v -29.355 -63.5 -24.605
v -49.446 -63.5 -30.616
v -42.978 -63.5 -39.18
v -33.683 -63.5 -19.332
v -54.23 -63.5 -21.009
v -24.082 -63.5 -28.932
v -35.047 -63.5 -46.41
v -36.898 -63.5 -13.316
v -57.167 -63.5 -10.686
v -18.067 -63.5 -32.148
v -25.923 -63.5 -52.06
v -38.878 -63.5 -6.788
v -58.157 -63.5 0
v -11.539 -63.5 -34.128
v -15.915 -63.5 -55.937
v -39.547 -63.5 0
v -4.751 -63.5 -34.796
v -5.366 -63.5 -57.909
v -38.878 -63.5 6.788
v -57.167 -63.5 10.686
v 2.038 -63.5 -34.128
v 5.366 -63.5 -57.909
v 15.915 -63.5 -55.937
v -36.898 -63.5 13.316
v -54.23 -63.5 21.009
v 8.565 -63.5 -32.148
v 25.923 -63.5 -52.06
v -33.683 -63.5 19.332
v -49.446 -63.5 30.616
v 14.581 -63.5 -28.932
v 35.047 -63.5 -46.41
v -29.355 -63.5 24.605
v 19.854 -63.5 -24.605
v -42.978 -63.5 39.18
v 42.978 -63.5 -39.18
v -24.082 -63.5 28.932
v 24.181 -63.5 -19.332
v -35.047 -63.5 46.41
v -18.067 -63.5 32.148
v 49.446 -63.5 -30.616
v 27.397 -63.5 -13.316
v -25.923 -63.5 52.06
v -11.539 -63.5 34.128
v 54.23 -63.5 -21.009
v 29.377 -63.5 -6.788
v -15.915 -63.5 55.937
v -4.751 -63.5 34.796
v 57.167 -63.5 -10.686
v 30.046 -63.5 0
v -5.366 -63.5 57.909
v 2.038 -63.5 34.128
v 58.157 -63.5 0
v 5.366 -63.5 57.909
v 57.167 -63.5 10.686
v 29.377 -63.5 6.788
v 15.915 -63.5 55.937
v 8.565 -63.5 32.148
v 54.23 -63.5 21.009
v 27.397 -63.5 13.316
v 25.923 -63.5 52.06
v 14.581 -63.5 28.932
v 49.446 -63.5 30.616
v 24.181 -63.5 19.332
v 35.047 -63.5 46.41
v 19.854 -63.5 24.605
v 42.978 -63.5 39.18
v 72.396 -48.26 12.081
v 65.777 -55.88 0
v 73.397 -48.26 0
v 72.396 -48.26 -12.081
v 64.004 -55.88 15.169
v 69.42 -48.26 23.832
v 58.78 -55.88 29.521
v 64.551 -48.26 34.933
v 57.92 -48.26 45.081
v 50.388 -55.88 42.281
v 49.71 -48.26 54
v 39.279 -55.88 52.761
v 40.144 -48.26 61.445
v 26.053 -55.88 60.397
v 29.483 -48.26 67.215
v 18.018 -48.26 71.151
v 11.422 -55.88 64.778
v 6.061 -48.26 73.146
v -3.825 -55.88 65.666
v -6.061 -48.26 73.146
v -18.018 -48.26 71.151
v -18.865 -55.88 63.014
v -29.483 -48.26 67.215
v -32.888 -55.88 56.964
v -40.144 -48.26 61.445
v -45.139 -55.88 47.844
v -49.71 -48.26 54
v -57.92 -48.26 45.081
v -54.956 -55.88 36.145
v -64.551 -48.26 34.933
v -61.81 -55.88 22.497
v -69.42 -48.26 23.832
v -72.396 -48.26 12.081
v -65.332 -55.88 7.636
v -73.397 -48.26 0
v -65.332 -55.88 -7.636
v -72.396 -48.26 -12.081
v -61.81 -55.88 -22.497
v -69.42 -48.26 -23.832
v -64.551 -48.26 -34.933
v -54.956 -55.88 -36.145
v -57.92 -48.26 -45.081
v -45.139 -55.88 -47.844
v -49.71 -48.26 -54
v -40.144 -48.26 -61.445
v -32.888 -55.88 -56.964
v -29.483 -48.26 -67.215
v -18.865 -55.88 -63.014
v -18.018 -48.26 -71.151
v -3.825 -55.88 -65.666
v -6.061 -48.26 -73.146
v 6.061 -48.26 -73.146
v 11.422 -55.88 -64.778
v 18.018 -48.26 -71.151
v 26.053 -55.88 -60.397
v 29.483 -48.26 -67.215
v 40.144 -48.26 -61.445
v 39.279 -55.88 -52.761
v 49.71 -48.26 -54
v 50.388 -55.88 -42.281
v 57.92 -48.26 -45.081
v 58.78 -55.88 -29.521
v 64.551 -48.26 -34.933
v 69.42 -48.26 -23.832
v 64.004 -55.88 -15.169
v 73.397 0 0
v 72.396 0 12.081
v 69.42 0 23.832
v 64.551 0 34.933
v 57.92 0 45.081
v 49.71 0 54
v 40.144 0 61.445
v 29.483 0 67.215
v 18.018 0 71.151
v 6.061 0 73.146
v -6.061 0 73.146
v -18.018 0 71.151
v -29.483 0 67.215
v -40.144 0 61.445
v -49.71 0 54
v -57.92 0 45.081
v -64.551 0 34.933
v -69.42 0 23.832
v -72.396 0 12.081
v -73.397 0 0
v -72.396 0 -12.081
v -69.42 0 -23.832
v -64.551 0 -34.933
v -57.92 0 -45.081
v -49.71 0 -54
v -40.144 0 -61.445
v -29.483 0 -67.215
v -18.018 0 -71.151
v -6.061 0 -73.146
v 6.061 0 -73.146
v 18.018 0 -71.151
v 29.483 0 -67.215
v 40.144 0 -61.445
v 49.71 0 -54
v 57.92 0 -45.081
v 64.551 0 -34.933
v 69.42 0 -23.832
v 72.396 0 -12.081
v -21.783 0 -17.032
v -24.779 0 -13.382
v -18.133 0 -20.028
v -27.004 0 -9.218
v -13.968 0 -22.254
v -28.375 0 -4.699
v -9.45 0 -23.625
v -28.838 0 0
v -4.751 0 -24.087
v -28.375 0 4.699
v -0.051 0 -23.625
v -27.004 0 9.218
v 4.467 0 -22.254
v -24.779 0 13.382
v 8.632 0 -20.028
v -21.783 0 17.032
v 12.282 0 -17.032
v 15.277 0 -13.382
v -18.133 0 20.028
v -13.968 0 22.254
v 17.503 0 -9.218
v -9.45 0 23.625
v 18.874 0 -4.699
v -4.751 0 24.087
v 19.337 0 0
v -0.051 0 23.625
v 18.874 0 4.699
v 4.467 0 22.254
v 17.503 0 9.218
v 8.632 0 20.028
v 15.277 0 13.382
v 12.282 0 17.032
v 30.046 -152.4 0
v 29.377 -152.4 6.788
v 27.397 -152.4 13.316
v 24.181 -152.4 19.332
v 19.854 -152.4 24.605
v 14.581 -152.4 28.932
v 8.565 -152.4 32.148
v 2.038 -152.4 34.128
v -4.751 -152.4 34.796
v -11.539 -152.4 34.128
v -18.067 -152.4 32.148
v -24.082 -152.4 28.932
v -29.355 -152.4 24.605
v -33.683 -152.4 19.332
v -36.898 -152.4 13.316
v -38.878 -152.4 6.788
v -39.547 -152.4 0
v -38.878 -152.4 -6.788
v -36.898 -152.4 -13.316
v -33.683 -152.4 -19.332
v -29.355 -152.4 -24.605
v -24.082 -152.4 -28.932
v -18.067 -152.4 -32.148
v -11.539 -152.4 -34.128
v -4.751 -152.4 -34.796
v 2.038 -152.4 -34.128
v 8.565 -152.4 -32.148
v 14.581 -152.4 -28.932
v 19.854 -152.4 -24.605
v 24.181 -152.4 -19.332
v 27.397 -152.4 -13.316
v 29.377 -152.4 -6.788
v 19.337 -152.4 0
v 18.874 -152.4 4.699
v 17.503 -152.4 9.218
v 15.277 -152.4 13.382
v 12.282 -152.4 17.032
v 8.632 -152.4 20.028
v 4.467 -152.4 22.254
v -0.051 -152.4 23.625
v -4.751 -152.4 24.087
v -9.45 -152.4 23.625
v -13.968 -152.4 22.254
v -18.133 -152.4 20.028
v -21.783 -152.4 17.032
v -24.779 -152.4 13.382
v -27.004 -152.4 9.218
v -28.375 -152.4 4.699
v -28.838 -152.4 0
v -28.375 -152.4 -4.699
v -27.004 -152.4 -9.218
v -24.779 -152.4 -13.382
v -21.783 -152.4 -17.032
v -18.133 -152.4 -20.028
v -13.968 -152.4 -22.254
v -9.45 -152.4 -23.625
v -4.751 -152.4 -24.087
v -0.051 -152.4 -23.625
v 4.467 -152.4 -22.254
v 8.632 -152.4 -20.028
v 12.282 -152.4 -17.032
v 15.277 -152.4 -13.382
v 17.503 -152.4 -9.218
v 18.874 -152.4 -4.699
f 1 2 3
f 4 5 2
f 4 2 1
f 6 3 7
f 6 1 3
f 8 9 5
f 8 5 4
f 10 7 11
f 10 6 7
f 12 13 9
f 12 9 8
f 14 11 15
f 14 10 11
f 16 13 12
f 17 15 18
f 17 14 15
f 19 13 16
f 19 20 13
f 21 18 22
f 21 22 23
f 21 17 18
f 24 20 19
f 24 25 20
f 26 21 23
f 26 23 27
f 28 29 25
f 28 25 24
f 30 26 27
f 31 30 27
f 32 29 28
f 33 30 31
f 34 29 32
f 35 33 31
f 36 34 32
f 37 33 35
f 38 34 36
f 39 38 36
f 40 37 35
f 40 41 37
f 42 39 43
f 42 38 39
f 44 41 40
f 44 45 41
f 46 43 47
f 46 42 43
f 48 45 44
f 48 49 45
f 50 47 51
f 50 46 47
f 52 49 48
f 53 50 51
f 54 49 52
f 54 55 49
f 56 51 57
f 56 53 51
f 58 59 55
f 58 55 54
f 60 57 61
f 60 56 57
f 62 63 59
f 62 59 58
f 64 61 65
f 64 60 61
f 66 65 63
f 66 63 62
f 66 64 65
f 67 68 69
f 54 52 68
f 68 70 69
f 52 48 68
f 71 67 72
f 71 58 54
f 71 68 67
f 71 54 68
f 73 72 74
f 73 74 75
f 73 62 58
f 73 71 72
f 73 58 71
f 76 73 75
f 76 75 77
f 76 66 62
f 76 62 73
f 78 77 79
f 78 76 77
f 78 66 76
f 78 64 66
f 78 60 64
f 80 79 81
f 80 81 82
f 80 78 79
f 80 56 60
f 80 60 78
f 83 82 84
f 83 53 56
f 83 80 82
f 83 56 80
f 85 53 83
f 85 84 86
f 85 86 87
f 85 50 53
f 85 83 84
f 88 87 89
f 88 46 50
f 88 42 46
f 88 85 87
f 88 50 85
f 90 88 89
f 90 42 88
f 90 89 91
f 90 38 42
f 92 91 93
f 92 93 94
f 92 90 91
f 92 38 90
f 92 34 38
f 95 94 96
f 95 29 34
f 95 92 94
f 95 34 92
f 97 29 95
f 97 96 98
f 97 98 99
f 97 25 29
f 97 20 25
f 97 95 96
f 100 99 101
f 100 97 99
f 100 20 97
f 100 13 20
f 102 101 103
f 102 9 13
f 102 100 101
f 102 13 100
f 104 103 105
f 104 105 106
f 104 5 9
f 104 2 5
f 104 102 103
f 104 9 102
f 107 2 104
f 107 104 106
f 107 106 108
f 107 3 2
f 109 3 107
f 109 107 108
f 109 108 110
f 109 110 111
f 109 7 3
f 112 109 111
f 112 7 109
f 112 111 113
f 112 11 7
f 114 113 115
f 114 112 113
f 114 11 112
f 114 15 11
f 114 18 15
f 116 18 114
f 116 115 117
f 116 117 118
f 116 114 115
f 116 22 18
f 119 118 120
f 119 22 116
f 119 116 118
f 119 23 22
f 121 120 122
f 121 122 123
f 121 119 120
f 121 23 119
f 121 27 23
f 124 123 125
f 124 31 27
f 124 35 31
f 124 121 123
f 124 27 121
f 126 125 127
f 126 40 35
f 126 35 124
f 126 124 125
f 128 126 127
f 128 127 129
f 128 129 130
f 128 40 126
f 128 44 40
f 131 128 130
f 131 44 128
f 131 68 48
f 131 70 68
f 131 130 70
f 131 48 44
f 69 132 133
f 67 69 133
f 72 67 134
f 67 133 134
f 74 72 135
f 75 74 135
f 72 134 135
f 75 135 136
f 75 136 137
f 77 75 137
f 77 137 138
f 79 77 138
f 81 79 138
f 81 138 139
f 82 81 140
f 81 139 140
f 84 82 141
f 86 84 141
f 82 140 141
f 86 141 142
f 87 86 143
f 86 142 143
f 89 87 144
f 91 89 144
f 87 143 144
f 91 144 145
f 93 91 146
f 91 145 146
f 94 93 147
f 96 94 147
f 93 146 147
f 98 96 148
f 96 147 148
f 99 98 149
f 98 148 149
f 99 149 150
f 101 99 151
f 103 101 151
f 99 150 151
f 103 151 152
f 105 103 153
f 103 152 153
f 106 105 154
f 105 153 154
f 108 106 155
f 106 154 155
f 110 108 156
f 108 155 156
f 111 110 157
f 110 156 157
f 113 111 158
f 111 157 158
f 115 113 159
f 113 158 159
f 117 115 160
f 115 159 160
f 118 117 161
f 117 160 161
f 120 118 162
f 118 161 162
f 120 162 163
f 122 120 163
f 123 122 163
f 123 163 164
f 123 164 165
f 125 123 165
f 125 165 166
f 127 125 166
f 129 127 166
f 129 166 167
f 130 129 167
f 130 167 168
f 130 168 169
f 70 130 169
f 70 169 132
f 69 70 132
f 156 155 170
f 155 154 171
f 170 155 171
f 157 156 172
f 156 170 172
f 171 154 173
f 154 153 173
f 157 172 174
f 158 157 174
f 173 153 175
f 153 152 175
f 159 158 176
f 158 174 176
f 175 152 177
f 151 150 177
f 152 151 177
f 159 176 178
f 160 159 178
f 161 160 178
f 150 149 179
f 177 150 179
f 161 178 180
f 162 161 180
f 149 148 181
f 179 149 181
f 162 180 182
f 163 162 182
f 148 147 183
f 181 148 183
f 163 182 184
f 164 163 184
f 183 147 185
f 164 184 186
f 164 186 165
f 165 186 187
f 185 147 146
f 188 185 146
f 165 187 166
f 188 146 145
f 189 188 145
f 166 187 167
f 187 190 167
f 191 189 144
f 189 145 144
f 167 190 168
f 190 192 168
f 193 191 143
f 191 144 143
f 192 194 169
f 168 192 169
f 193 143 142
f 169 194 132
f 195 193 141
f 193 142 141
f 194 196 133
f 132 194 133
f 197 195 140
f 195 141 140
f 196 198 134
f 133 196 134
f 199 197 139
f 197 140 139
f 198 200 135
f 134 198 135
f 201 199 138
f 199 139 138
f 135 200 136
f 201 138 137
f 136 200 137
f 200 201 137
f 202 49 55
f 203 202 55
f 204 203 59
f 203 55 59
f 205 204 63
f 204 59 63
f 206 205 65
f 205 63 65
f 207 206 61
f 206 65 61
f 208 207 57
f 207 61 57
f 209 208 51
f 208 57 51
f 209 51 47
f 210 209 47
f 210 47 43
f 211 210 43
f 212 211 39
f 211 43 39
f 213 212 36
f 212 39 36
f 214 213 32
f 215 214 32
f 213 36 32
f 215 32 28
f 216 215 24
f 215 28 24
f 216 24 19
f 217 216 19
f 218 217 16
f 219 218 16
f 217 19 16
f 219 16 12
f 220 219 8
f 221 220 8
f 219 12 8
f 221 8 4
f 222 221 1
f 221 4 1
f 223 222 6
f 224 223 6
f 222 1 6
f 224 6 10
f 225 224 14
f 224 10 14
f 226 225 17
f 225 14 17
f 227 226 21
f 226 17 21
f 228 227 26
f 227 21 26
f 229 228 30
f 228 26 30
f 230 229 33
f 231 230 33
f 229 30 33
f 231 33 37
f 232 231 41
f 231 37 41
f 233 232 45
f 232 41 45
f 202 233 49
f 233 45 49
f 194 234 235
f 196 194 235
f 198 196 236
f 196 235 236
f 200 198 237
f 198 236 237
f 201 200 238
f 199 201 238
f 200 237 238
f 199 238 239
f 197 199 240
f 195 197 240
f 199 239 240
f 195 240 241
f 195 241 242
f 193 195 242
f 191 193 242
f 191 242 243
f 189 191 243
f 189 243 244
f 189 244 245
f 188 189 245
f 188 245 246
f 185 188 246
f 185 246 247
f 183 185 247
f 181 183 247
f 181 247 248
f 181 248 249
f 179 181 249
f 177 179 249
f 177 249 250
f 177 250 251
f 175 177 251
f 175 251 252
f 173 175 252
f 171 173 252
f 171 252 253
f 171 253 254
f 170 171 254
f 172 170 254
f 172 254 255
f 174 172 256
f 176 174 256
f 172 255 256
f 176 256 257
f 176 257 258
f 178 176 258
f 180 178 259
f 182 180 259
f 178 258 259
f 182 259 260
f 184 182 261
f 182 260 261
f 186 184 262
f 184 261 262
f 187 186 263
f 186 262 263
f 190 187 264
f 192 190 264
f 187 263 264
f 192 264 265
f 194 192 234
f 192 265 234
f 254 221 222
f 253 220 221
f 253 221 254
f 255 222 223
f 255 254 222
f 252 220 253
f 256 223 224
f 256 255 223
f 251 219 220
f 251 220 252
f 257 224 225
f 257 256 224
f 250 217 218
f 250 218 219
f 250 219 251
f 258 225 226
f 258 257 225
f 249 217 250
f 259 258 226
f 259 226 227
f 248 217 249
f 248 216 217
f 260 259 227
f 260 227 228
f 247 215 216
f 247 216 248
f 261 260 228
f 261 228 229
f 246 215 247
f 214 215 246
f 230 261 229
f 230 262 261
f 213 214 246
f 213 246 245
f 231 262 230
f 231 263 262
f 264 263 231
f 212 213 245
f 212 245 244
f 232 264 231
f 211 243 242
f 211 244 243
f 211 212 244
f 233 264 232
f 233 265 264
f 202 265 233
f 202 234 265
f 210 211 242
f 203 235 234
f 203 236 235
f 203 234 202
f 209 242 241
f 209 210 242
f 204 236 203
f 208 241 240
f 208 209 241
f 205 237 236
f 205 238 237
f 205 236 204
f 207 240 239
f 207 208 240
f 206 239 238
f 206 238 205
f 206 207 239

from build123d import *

# Parameters (mm, degrees)
F0_R     = 73.396839
F1_DEPTH = 63.5
F2_SIZE  = 15.24
F3_R     = 34.79629
F4_DEPTH = 88.9
F5_R     = 24.08748
F6_DEPTH = 263.398


with BuildPart() as f1:
    # F0 (on Front) → F1 (new body)
    with BuildSketch(Plane.XZ):
        Circle(F0_R)
    extrude(amount=F1_DEPTH)

    # F2
    f2_edges = [f1.edges().sort_by_distance(p)[0] for p in [
        (-73.396839, -63.5, 0),
    ]]
    chamfer(f2_edges, length=F2_SIZE)

    # F3 (on face) → F4 (join)
    with BuildSketch(Plane.XZ.offset(63.5)):
        with Locations((-4.750563, 0)):
            Circle(F3_R)
    extrude(amount=F4_DEPTH)

    # F5 (on face) → F6 (cut)
    with BuildSketch(Plane.XZ.offset(152.4)):
        with Locations((-4.750563, 0)):
            Circle(F5_R)
    extrude(amount=-F6_DEPTH, mode=Mode.SUBTRACT)


solid = f1.part
